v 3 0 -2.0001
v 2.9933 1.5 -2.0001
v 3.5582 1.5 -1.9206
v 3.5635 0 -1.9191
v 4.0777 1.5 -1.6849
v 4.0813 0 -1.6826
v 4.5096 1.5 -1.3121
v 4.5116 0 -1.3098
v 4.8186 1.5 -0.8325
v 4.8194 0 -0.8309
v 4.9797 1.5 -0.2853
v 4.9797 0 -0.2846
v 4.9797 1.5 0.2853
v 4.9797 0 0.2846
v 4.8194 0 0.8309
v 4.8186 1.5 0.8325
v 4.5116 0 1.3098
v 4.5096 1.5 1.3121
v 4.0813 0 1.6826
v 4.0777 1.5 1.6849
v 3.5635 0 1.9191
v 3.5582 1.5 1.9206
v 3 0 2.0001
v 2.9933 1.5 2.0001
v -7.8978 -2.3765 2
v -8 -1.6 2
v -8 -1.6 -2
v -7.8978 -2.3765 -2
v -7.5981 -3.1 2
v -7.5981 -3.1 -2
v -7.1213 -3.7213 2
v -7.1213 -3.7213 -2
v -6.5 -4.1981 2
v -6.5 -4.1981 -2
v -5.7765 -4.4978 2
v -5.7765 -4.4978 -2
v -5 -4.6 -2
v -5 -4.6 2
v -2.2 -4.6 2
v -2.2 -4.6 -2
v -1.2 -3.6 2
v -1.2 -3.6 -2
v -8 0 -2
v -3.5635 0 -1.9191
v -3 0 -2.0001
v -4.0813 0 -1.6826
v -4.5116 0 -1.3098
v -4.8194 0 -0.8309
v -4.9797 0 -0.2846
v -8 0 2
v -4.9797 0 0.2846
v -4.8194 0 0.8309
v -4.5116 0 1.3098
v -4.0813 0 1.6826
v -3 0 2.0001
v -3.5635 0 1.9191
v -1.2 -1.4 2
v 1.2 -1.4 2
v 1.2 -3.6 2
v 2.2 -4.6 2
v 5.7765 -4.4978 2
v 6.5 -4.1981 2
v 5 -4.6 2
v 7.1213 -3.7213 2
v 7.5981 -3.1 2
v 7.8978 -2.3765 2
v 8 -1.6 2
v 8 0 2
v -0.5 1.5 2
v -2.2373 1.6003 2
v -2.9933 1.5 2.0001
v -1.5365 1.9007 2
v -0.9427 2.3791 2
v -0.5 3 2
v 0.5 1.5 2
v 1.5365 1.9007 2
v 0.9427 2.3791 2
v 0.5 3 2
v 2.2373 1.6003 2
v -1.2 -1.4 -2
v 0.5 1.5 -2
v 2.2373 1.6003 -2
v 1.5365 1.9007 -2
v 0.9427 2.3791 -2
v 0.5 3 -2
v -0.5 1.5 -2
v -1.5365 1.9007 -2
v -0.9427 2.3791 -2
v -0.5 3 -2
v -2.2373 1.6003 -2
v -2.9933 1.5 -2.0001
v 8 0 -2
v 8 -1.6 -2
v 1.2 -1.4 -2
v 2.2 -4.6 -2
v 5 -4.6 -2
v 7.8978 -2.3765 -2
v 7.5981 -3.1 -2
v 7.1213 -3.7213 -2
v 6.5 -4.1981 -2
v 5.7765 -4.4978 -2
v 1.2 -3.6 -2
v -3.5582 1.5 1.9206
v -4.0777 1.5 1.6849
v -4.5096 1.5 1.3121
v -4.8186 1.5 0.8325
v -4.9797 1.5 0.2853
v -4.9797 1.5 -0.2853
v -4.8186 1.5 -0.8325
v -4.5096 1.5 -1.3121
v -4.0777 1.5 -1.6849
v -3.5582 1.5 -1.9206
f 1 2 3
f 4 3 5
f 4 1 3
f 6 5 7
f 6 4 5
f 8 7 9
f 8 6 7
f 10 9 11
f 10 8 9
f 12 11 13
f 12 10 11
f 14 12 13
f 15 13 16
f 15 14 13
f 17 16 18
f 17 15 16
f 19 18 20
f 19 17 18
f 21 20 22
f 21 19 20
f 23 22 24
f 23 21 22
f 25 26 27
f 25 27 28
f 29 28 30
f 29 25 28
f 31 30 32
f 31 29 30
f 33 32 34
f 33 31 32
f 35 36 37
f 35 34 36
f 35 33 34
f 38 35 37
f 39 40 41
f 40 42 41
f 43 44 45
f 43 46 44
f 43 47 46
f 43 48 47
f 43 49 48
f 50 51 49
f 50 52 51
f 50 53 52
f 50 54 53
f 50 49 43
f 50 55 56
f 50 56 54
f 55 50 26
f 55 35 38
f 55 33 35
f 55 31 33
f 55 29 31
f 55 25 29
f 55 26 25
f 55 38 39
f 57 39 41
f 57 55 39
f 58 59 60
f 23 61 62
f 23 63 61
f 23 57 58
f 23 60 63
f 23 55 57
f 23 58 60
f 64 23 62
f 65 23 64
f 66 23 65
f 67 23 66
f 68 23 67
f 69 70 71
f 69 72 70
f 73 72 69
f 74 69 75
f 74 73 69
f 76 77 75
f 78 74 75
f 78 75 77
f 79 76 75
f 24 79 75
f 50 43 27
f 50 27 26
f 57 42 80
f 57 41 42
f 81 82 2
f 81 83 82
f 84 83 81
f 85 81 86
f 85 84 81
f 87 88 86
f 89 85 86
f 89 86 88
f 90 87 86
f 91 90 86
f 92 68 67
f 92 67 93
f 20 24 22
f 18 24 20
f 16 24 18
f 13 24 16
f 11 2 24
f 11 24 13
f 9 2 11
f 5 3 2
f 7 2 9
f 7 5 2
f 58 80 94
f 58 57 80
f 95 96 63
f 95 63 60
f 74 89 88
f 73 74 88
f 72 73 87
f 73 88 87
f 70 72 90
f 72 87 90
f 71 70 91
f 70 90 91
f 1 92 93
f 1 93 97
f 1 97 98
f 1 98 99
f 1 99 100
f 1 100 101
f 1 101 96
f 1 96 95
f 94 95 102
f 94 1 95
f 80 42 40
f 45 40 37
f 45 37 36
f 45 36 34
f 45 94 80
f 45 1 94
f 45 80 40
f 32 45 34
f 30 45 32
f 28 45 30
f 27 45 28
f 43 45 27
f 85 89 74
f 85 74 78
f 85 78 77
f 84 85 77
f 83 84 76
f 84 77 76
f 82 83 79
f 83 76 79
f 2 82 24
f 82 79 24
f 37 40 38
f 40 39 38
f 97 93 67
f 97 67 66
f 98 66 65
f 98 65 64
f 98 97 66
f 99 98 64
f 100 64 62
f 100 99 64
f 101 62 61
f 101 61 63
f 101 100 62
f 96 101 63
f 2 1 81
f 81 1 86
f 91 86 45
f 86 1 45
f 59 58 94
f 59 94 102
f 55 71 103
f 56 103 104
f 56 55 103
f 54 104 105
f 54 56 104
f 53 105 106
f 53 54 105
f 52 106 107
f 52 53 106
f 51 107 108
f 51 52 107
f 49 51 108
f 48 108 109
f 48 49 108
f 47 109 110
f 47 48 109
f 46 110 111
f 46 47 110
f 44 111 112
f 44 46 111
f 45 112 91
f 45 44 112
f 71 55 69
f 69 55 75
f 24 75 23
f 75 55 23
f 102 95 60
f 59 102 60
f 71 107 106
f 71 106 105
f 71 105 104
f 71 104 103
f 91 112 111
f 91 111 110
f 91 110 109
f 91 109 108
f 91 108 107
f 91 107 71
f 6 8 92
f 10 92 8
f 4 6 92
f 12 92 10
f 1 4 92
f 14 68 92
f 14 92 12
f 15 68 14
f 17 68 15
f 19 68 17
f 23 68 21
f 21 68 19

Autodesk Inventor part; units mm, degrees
ref_plane "YZ Plane" through (0, 0, 0) normal (1, 0, 0) x (0, 1, 0)
ref_plane "XZ Plane" through (0, 0, 0) normal (0, 1, 0) x (-1, 0, 0)
ref_plane "XY Plane" through (0, 0, 0) normal (0, 0, 1) x (1, 0, 0)
sketch "Sketch1" plane through (0, 0, 0) normal (0, 1, 0) x (-1, 0, 0)
  line L0 (8, 2) -> (-8, 2)
  line L1 (-8, 2) -> (-8, -2)
  line L2 (-8, -2) -> (8, -2)
  line L3 (8, -2) -> (8, 2)
  line L4 (11.2, 0) -> (-11.2, 0) construction
  line L5 (0, -2.8) -> (0, 2.8) construction
  point P0 (0, 0)
  dimension "d0" = 16
  dimension "d1" = 4
extrude "Extrusion1" add sketch "Sketch1" against normal blind 4.6
sketch "Sketch2" plane through (-8, 0, 2) normal (0, 0, 1) x (1, 0, 0)
  line L0 (6.8, -1.4) -> (9.2, -1.4)
  line L1 (9.2, -1.4) -> (9.2, -4.6)
  line L2 (9.2, -4.6) -> (6.8, -4.6)
  line L3 (6.8, -4.6) -> (6.8, -1.4)
  line L4 (16, -4.6) -> (0, -4.6) projected
  point P0 (8, 0)
  point P1 (8, -4.6)
  point P2 (8, -4.6)
  dimension "d4" = 2.4
  dimension "d5" = 3.2
extrude "Extrusion2" cut sketch "Sketch2" against normal through all
chamfer "Chamfer1" distance 1 angle 45 2 edges at (-1.2, -4.6, 0) (1.2, -4.6, 0)
fillet "Fillet1" radius 3 2 edges at (-8, -4.6, 0) (8, -4.6, 0)
sketch "Sketch3" plane through (0, 0, 0) normal (0, 1, 0) x (1, 0, 0)
  line L0 (-3, 0) -> (3, 0) construction
  line L1 (-3, -2.0001) -> (3, -2.0001)
  line L2 (3, 2.0001) -> (-3, 2.0001)
  arc A0 (-3, 2.0001) -> (-3, -2.0001) centre (-3, 0) ccw
  arc A1 (3, -2.0001) -> (3, 2.0001) centre (3, 0) ccw
  point P0 (0, 0)
  dimension "d12" = 3
extrude "Extrusion3" add sketch "Sketch3" along normal blind 1.5
sketch "Sketch4" plane through (0, 1.5, 0) normal (0, 1, 0) x (1, 0, 0)
  line L0 (-1.2, -2) -> (1.2, -2) projected
  line L1 (0.5, 2) -> (-0.5, 2)
  line L2 (-0.5, 2) -> (-0.5, -2)
  line L3 (-0.5, -2) -> (0.5, -2)
  line L4 (0.5, -2) -> (0.5, 2)
  line L5 (0.5, 2) -> (-0.5, -2) construction
  line L6 (-0.5, 2) -> (0.5, -2) construction
  point P0 (0, 0)
  dimension "d15" = 1
extrude "Extrusion4" add sketch "Sketch4" along normal blind 1.5
fillet "Fillet2" radius 2.8 2 edges at (0.5, 1.5, 0) (-0.5, 1.5, 0)
properties part number "Sliding_switch"
